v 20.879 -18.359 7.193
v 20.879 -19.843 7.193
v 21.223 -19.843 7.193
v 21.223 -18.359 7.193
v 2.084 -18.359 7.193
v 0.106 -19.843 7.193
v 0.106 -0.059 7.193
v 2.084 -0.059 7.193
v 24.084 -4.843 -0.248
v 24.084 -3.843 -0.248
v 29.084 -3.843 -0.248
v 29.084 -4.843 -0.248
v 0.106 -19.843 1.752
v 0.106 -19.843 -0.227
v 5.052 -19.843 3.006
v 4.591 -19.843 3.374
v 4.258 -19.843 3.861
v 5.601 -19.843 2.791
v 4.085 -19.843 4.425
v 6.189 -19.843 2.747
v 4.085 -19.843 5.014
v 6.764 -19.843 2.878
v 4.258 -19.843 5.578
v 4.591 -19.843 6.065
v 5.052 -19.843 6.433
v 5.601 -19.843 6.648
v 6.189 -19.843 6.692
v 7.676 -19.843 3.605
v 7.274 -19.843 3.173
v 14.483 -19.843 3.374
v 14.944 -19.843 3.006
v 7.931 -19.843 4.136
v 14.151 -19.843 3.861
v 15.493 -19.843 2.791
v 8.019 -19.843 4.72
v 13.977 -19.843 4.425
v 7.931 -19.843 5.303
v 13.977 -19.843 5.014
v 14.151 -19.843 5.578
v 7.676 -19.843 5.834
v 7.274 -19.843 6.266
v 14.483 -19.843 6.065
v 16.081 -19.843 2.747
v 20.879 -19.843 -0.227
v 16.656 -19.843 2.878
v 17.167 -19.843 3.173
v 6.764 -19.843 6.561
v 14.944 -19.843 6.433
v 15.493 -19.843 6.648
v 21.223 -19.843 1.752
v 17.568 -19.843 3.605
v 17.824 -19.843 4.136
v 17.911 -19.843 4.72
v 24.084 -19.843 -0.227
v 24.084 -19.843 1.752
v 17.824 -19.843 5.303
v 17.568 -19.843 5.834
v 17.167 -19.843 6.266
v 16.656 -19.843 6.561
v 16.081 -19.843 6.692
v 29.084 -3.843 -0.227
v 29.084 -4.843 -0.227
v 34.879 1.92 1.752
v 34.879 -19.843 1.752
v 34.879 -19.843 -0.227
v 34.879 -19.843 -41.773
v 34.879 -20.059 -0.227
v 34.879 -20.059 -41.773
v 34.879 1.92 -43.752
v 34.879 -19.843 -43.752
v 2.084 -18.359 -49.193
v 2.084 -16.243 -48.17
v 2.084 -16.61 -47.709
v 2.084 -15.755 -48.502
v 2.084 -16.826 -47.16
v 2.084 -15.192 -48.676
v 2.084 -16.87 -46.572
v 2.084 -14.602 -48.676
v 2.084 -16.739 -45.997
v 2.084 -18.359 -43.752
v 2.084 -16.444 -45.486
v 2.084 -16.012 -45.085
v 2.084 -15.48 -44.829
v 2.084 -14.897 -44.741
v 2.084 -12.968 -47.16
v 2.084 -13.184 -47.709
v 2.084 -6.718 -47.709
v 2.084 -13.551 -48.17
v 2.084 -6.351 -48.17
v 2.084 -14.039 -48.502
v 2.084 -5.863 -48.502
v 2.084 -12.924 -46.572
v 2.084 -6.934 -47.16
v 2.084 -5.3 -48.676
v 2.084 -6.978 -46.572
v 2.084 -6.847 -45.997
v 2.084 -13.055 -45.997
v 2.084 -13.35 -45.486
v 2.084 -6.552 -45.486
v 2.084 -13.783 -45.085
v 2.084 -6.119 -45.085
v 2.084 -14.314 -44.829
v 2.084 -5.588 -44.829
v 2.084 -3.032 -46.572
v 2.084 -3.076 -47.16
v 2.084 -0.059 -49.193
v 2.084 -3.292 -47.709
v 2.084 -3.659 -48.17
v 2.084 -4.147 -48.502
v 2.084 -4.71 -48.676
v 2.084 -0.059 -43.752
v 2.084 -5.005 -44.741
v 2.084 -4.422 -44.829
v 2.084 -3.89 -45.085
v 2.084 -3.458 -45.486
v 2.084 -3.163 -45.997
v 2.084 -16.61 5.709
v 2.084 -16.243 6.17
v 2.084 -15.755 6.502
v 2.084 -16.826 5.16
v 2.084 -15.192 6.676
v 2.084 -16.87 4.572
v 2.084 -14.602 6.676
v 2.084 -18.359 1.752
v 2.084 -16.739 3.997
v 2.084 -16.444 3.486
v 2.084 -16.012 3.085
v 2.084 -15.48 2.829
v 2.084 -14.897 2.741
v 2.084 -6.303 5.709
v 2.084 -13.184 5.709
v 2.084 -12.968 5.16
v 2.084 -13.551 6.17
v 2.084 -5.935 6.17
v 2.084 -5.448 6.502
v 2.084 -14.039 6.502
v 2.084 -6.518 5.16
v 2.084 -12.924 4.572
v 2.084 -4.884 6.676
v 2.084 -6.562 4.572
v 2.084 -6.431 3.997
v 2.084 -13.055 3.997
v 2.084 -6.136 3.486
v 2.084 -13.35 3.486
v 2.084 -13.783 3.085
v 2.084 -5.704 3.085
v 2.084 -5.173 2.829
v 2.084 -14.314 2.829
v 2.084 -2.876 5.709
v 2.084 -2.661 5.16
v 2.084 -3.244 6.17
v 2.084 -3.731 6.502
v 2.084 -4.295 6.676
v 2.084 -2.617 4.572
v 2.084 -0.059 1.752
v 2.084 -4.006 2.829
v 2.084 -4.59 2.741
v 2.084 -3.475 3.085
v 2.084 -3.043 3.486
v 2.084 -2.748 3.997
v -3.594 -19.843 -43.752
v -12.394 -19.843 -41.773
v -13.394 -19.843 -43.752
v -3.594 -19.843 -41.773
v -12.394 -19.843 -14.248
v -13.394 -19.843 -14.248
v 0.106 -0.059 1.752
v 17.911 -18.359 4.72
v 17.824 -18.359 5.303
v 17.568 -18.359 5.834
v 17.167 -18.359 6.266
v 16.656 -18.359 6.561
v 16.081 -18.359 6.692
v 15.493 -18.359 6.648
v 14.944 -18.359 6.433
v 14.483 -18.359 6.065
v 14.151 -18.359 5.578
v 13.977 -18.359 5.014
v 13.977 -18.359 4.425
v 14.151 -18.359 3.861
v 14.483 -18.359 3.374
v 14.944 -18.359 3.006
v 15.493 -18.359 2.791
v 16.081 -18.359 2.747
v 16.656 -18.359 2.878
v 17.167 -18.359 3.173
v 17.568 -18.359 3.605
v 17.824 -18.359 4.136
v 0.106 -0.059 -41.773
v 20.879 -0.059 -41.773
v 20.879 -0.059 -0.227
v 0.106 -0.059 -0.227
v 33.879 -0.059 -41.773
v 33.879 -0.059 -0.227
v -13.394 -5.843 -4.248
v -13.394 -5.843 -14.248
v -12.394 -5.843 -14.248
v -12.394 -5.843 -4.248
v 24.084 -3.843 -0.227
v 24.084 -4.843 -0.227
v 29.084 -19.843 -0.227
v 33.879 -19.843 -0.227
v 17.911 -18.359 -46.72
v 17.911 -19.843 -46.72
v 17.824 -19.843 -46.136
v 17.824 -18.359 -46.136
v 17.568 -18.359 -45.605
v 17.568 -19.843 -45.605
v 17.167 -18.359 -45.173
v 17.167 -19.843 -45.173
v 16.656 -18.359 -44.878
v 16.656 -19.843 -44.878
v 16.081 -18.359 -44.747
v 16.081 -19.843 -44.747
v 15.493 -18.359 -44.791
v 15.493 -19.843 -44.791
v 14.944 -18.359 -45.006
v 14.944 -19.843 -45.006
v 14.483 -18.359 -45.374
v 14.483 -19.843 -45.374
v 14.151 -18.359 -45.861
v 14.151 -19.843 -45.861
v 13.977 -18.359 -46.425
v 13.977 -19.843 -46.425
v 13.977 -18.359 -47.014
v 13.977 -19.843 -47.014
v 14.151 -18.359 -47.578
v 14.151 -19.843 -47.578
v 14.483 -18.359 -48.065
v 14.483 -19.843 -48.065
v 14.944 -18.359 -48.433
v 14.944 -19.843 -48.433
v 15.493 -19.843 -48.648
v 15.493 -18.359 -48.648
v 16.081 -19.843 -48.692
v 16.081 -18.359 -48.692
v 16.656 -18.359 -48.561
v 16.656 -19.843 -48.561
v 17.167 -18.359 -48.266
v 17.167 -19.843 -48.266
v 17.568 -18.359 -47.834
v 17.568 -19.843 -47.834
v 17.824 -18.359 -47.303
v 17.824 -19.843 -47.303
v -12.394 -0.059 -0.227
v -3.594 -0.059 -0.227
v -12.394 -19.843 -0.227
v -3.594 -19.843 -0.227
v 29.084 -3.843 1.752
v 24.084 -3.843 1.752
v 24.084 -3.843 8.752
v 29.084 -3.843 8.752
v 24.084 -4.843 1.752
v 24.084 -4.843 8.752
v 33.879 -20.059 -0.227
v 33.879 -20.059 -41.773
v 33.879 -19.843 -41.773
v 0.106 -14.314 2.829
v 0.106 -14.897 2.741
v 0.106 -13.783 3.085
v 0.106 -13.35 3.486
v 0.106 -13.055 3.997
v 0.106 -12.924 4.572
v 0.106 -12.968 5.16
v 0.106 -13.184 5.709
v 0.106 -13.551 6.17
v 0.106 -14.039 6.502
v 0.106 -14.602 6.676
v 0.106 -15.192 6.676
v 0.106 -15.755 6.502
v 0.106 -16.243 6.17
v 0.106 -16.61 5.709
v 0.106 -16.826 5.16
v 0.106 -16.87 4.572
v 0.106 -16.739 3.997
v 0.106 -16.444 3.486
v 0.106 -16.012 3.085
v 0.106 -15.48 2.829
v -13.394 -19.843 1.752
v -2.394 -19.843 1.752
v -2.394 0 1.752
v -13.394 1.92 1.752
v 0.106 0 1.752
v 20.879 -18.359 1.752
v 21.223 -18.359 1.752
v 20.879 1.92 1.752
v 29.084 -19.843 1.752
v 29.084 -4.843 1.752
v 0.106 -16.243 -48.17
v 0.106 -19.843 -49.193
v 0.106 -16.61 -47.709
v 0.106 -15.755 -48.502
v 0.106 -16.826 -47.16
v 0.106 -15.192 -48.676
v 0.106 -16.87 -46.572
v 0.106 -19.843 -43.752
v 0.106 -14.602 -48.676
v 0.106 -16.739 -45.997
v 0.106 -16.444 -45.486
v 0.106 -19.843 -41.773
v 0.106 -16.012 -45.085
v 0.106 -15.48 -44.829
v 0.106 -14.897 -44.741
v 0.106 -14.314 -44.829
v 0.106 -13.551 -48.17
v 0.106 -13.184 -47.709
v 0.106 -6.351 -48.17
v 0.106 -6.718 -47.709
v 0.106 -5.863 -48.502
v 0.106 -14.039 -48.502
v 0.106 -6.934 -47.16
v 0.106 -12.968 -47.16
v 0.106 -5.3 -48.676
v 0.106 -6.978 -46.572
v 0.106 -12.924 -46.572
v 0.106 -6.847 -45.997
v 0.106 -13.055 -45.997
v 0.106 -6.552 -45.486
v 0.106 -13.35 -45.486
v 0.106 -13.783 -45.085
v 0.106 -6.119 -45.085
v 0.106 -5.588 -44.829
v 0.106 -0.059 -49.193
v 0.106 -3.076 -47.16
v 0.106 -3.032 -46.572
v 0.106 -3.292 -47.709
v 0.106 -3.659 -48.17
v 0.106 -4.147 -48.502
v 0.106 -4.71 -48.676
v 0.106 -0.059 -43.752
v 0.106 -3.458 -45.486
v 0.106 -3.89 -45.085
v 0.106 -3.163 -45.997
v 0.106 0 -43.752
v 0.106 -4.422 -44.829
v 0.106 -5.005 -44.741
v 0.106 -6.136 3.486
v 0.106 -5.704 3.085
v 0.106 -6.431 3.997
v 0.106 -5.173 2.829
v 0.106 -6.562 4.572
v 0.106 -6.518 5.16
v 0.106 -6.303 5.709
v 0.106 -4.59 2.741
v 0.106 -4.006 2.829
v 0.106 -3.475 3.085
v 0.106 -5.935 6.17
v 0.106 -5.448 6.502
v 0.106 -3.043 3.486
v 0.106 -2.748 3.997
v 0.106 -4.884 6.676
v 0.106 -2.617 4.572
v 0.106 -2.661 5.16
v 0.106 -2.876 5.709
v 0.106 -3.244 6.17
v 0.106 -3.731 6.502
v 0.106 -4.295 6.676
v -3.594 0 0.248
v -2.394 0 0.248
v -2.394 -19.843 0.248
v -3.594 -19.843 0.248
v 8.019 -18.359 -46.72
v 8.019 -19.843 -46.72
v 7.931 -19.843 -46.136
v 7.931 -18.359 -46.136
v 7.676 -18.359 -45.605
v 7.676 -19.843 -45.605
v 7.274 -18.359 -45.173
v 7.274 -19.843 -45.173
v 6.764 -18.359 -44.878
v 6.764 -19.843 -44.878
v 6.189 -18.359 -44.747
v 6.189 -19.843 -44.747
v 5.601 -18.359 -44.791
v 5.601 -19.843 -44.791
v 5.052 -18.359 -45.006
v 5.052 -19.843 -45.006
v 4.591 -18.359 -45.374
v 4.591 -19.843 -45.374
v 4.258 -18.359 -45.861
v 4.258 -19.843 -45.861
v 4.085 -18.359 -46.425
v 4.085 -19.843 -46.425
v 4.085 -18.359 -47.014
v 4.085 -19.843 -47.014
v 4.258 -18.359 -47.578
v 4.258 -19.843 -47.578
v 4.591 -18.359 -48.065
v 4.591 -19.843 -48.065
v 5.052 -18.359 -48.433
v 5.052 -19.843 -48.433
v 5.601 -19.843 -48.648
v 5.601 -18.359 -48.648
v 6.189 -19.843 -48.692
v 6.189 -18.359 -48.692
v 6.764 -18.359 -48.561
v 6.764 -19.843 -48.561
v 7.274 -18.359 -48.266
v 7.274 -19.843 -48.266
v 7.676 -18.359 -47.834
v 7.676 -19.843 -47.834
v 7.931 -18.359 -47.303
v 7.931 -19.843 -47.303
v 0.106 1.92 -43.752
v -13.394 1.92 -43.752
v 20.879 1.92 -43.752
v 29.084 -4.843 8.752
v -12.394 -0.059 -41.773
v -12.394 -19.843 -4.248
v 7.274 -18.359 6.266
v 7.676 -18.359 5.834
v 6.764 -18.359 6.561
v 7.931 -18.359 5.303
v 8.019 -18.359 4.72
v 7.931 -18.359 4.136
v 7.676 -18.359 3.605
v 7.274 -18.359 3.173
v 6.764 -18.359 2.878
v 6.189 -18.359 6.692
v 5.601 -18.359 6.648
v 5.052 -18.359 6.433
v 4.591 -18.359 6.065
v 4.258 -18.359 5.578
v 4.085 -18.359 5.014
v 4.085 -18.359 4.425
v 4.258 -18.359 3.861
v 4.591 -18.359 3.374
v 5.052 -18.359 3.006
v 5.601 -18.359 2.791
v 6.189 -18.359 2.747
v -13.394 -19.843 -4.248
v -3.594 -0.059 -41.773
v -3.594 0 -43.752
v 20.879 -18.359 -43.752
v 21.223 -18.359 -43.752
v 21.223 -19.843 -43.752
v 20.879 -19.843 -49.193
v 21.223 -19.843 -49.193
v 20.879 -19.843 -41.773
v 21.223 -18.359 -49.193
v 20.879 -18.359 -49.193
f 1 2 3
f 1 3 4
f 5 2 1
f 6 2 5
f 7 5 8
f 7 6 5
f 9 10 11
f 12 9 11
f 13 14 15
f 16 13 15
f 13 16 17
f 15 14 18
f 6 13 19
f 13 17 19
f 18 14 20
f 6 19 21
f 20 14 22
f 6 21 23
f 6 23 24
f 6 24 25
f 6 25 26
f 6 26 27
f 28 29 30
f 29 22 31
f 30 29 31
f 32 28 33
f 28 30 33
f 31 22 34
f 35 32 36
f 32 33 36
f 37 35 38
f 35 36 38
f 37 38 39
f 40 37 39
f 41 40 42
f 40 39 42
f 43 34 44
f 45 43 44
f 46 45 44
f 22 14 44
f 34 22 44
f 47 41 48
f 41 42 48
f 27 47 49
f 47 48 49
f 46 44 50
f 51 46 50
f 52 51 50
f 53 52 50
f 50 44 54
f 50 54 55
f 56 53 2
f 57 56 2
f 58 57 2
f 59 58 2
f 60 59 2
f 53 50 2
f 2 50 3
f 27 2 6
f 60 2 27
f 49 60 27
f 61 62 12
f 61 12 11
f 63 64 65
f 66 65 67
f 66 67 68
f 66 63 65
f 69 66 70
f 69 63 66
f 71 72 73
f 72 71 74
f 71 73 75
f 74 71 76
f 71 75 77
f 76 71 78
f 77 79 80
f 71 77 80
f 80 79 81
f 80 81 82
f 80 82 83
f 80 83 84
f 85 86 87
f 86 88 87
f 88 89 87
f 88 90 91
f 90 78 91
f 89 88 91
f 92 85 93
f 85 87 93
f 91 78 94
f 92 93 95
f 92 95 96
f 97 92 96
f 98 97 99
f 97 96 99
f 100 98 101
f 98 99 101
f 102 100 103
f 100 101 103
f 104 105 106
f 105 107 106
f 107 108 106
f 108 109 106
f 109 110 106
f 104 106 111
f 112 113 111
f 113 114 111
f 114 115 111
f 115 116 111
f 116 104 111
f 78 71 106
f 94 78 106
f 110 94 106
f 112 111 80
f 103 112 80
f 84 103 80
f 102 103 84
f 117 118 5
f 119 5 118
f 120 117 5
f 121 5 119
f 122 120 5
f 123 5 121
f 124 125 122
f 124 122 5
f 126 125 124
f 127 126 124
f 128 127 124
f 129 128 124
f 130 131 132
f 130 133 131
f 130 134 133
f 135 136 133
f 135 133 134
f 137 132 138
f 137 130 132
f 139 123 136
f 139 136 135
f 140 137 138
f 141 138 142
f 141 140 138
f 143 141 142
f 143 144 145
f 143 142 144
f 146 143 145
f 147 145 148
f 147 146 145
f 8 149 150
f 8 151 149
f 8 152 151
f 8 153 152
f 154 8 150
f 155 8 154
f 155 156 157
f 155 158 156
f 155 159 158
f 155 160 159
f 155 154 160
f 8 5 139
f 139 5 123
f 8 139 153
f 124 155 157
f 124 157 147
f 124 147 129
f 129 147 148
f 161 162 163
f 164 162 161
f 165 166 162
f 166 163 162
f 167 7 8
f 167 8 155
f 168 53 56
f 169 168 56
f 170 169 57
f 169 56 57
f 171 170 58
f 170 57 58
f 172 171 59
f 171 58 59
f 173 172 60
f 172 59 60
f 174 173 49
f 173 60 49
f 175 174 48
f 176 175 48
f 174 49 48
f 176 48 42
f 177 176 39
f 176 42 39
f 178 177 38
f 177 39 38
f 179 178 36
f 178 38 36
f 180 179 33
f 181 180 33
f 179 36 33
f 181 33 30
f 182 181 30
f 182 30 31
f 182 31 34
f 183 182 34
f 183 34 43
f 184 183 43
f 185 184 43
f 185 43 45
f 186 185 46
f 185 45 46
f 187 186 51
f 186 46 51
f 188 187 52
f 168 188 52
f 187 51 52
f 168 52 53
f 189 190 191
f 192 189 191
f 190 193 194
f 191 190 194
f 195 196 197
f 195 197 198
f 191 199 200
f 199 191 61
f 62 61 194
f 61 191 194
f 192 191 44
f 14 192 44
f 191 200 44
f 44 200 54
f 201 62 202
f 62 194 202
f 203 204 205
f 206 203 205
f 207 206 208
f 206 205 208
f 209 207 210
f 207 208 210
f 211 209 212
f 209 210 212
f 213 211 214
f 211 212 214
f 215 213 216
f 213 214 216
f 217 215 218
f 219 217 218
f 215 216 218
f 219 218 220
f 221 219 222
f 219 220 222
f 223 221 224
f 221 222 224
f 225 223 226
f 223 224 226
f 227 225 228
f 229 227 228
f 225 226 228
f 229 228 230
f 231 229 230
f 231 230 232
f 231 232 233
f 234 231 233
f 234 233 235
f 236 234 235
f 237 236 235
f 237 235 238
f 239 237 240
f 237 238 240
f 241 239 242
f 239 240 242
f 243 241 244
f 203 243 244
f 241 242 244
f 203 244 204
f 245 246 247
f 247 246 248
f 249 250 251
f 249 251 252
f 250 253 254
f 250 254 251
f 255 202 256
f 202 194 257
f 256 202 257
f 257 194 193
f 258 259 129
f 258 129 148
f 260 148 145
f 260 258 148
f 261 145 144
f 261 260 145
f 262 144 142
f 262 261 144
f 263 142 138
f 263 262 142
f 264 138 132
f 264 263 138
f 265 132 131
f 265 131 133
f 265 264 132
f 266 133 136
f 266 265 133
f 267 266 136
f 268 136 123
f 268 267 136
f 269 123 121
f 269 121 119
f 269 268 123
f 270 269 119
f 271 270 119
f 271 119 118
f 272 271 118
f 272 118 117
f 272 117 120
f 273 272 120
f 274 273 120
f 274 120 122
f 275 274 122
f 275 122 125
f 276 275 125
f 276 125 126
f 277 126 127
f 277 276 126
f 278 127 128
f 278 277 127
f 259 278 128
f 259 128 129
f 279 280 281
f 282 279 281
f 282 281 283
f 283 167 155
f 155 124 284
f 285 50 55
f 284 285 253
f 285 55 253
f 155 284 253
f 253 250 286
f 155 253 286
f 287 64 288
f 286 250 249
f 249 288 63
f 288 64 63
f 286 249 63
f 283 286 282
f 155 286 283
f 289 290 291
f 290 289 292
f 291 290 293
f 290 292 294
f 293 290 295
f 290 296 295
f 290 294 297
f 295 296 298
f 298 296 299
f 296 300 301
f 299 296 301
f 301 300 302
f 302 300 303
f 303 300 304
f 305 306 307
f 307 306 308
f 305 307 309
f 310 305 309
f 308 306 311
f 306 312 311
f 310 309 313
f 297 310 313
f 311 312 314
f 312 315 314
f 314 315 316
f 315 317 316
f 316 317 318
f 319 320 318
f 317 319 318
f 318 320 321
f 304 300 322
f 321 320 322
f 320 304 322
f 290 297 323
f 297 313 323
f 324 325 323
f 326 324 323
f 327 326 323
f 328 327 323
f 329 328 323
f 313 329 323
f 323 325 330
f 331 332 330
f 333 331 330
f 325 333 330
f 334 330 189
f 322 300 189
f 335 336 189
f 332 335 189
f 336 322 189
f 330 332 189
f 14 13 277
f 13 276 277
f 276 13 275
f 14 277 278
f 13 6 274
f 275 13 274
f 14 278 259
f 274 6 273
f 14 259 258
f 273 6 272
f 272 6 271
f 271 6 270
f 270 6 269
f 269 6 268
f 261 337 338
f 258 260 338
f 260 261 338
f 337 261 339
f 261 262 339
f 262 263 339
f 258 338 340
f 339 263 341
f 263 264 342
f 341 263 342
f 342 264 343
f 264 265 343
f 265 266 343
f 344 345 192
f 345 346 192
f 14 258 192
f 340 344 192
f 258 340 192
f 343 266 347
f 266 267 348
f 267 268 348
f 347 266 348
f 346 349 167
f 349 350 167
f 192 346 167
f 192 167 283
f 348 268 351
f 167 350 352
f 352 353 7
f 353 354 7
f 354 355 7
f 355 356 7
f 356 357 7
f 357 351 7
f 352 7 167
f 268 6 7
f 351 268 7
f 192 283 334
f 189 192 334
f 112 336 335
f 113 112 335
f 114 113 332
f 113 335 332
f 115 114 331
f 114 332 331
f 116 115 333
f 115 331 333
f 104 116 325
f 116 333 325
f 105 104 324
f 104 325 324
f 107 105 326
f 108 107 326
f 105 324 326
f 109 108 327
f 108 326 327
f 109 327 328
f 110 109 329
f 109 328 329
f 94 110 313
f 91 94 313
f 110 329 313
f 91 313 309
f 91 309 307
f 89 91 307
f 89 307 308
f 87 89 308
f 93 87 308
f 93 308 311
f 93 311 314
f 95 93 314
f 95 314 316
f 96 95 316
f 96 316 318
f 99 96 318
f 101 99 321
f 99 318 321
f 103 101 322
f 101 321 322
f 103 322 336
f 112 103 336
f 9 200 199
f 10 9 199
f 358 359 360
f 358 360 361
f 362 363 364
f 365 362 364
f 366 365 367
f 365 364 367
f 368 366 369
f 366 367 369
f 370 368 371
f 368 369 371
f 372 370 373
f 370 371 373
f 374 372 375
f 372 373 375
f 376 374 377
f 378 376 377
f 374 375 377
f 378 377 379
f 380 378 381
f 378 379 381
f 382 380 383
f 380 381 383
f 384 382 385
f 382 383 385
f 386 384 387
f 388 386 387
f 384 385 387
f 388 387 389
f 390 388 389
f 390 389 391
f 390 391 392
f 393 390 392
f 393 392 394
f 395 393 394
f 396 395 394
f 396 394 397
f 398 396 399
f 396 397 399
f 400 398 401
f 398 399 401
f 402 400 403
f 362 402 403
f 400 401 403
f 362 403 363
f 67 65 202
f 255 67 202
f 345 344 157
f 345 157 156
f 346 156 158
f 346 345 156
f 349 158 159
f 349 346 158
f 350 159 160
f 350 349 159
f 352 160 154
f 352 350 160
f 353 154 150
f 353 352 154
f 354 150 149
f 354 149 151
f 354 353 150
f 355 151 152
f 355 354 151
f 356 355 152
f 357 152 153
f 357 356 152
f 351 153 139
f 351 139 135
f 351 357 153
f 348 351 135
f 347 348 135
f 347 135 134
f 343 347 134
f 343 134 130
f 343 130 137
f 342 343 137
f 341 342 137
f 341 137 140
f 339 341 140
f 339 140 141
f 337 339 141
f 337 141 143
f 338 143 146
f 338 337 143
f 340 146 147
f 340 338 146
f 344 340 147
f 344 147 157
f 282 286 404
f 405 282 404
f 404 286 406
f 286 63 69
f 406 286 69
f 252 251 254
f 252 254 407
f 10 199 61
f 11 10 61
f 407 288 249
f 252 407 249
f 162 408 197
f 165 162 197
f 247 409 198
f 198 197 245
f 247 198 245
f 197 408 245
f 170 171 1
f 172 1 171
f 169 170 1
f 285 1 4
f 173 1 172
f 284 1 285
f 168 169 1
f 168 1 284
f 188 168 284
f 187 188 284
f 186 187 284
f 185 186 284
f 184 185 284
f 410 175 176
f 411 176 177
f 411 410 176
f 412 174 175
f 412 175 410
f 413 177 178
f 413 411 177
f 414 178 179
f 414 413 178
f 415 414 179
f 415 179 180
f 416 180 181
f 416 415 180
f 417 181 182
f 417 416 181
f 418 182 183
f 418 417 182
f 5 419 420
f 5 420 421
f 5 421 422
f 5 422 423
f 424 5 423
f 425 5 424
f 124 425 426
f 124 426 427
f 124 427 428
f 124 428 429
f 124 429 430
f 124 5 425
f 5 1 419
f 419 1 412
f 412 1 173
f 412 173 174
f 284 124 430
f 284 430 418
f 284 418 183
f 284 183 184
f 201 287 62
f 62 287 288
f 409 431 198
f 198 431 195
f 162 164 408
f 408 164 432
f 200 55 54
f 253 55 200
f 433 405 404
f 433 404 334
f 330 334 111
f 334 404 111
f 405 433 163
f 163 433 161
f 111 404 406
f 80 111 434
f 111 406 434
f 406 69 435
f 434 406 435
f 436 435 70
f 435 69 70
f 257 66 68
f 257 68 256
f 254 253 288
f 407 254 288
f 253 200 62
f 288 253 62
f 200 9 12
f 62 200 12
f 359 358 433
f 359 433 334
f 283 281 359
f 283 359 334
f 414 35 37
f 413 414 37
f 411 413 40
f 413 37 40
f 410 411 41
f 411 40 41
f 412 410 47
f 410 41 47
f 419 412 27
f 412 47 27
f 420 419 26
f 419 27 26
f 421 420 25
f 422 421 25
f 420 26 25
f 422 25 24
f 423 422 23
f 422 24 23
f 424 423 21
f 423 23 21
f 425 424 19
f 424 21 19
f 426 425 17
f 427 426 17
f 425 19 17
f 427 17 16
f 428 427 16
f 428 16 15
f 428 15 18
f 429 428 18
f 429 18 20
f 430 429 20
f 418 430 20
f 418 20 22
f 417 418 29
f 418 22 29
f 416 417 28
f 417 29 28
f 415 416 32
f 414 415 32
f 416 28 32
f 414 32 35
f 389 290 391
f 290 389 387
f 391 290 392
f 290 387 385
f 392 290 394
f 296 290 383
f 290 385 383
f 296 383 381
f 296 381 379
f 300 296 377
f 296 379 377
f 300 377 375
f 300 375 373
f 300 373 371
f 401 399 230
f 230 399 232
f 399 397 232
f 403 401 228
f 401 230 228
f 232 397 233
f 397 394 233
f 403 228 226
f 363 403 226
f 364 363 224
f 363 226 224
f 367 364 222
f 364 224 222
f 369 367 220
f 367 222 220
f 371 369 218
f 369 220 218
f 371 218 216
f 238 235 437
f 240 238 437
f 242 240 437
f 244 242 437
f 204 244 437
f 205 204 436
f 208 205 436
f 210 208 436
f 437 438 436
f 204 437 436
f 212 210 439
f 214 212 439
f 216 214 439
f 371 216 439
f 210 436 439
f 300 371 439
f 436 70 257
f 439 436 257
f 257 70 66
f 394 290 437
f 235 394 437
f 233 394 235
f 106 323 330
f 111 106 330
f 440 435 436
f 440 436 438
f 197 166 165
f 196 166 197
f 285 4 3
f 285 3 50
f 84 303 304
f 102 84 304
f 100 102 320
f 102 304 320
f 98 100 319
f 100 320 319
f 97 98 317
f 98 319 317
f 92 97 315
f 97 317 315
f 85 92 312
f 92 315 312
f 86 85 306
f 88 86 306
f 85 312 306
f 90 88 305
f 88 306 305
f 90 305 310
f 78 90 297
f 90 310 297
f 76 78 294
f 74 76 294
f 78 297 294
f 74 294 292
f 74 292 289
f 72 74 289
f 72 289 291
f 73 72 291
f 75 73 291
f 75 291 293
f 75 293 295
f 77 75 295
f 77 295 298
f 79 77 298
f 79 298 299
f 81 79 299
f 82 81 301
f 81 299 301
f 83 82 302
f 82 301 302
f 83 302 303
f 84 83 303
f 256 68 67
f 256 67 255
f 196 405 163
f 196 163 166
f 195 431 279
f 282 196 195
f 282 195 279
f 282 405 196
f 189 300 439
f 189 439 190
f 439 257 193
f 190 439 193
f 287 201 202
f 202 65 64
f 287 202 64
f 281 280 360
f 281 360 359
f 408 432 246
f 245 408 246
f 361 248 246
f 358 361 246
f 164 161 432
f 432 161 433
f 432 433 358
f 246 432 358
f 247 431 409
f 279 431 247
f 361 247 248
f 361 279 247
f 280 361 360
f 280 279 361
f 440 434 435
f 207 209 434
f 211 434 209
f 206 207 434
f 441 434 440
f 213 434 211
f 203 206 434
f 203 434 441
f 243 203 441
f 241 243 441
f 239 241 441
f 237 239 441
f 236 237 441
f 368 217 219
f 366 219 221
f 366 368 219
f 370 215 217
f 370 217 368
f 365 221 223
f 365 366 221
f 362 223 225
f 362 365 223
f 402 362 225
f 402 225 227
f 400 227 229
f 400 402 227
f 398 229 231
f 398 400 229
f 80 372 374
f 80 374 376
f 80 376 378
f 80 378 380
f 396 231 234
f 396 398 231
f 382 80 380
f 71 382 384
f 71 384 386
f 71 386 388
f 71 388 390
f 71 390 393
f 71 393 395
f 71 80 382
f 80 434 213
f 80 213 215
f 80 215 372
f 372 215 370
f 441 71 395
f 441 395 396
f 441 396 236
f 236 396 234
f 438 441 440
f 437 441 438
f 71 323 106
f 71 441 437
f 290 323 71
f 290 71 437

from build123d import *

# Parameters (mm, degrees)
SKETCH2_W                 = 7.5
SKETCH2_H                 = 20
SKETCH2_R                 = 2
BOSS_EXTRUDE1_DEPTH       = 2
SKETCH4_W                 = 21
SKETCH4_H                 = 20
BOSS_EXTRUDE2_DEPTH       = 2
SKETCH5_W                 = 21
SKETCH5_H                 = 46
BOSS_EXTRUDE3_DEPTH       = 2
SKETCH6_W                 = 21
SKETCH6_H                 = 2
BOSS_EXTRUDE4_DEPTH       = 22
SKETCH7_W                 = 6.5
SKETCH7_H                 = 20
SKETCH7_R                 = 2
BOSS_EXTRUDE7_DEPTH       = 2
SKETCH8_W                 = 20
SKETCH8_H                 = 6.5
SKETCH8_R                 = 2
BOSS_EXTRUDE9_DEPTH       = 1.5
SKETCH9_R                 = 2
BOSS_EXTRUDE10_DEPTH      = 1.5
SCALE1_SCALE              = 0.98
SCALE2_SCALE              = 0.98
SCALE3_SCALE              = 1.03
BOSS_EXTRUDE11_DEPTH      = 14
SKETCH13_W                = 1
SKETCH13_H                = 41.546904
BOSS_EXTRUDE12_DEPTH      = 20
SKETCH15_W                = 13.656209454
SKETCH15_H                = 5.440666
CUT_EXTRUDE1_DEPTH        = 20
SKETCH16_W                = 13.65620945
SKETCH16_H                = 5.440666
CUT_EXTRUDE2_DEPTH        = 20
BOSS_EXTRUDE13_DEPTH      = 13.5
SKETCH18_W                = 2.5
SKETCH18_H                = 19.843095219
CUT_EXTRUDE3_DEPTH        = 51.944418
SKETCH19_W                = 1
SKETCH19_H                = 41.546904
BOSS_EXTRUDE14_DEPTH      = 19.78424
CUT_EXTRUDE4_REACH        = 52.944
SKETCH20_W                = 5
SKETCH20_H                = 15
SKETCH21_W                = 10
SKETCH21_H                = 14
CUT_EXTRUDE5_DEPTH        = 19.5
SKETCH22_W                = 5
SKETCH22_H                = 1
BOSS_EXTRUDE15_DEPTH      = 7
BOSS_EXTRUDE15_DEPTH_BACK = 2
SKETCH23_W                = 1.2
SKETCH23_H                = 19.843095219
CUT_EXTRUDE9_DEPTH        = 44


with BuildPart() as part:
    # Sketch2 → Boss-Extrude1 (new body)
    with BuildSketch(Plane(origin=(0, 0, 0), x_dir=(0, 0, -1), z_dir=(1, 0, 0))):
        with Locations((-3.75, -10)):
            Rectangle(SKETCH2_W, SKETCH2_H)
        with Locations((-5, -4.580102725)):
            Circle(SKETCH2_R, mode=Mode.SUBTRACT)
        with Locations((-5, -15)):
            Circle(SKETCH2_R, mode=Mode.SUBTRACT)
    extrude(amount=BOSS_EXTRUDE1_DEPTH)

    # Sketch4 → Boss-Extrude2 (add)
    with BuildSketch(Plane.XY):
        with Locations((10.5, -10)):
            Rectangle(SKETCH4_W, SKETCH4_H)
    extrude(amount=BOSS_EXTRUDE2_DEPTH)

    # Sketch5 → Boss-Extrude3 (add)
    with BuildSketch(Plane(origin=(0, 0, 0), x_dir=(1, 0, 0), z_dir=(0, 1, 0))):
        with Locations((10.5, 21)):
            Rectangle(SKETCH5_W, SKETCH5_H)
    extrude(amount=BOSS_EXTRUDE3_DEPTH)

    # Sketch6 → Boss-Extrude4 (add)
    with BuildSketch(Plane(origin=(0, 2, 0), x_dir=(1, 0, 0), z_dir=(0, 1, 0))):
        with Locations((10.5, 43)):
            Rectangle(SKETCH6_W, SKETCH6_H)
    extrude(amount=-BOSS_EXTRUDE4_DEPTH)

    # Sketch7 → Boss-Extrude7 (add)
    with BuildSketch(Plane.ZY):
        with Locations((-46.25, -10)):
            Rectangle(SKETCH7_W, SKETCH7_H)
        with Locations((-47, -5)):
            Circle(SKETCH7_R, mode=Mode.SUBTRACT)
        with Locations((-47, -15)):
            Circle(SKETCH7_R, mode=Mode.SUBTRACT)
    extrude(amount=-BOSS_EXTRUDE7_DEPTH)

    # Sketch8 → Boss-Extrude9 (add)
    with BuildSketch(Plane.XZ.offset(20)):
        with Locations((11, -46.25)):
            Rectangle(SKETCH8_W, SKETCH8_H)
        with Locations((6, -47)):
            Circle(SKETCH8_R, mode=Mode.SUBTRACT)
        with Locations((16, -47)):
            Circle(SKETCH8_R, mode=Mode.SUBTRACT)
    extrude(amount=-BOSS_EXTRUDE9_DEPTH)

    # Sketch9 → Boss-Extrude10 (add)
    with BuildSketch(Plane.XZ.offset(20)):
        Polygon((21, 2), (21, 7.5), (16, 7.5), (6, 7.5), (2, 7.5), (2, 2), align=None)
        with Locations((6, 5)):
            Circle(SKETCH9_R, mode=Mode.SUBTRACT)
        with Locations((16, 5)):
            Circle(SKETCH9_R, mode=Mode.SUBTRACT)
    extrude(amount=-BOSS_EXTRUDE10_DEPTH)


with BuildPart() as part_1:
    # Scale1: scaled about (9.7960723, -5.455619142, -21)
    add(part.part.scale(SCALE1_SCALE).moved(Location((0.195921446, -0.109112383, -0.42))))


with BuildPart() as part_2:
    # Scale2: scaled about (9.7960723, -5.455619142, -21)
    add(part_1.part.scale(SCALE2_SCALE).moved(Location((0.195921446, -0.109112383, -0.42))))


with BuildPart() as part_3:
    # Scale3: scaled about (9.7960723, -5.455619142, -21)
    add(part_2.part.scale(SCALE3_SCALE).moved(Location((-0.293882169, 0.163668574, 0.63))))

    # Sketch11 → Boss-Extrude11 (add)
    with BuildSketch(Plane(origin=(20.879132028, 0, 0), x_dir=(0, 0, -1), z_dir=(1, 0, 0))):
        Polygon((-1.751876, 1.919568781), (43.751876, 1.919568781), (43.751876, -18.359277219), (49.192542, -18.359277219), (49.192542, -19.843095219), (41.773452, -19.843095219), (41.773452, -0.058855219), (0.226548, -0.058855219), (0.226548, -19.843095219), (-7.192542, -19.843095219), (-7.192542, -18.359277219), (-1.751876, -18.359277219), align=None)
    extrude(amount=BOSS_EXTRUDE11_DEPTH)

    # Sketch13 → Boss-Extrude12 (add)
    with BuildSketch(Plane(origin=(0, -0.058855219, 0), x_dir=(-1, 0, 0), z_dir=(0, -1, 0))):
        with Locations((-34.379132028, 21)):
            Rectangle(SKETCH13_W, SKETCH13_H)
    extrude(amount=BOSS_EXTRUDE12_DEPTH)

    # Sketch15 → Cut-Extrude1 (cut)
    with BuildSketch(Plane(origin=(0, -18.359277219, 0), x_dir=(1, 0, 0), z_dir=(0, 1, 0))):
        with Locations((28.051027301, 46.472209)):
            Rectangle(SKETCH15_W, SKETCH15_H)
    extrude(amount=-CUT_EXTRUDE1_DEPTH, mode=Mode.SUBTRACT)

    # Sketch16 → Cut-Extrude2 (cut)
    with BuildSketch(Plane(origin=(0, -18.359277219, 0), x_dir=(1, 0, 0), z_dir=(0, 1, 0))):
        with Locations((28.051027303, -4.472209)):
            Rectangle(SKETCH16_W, SKETCH16_H)
    extrude(amount=-CUT_EXTRUDE2_DEPTH, mode=Mode.SUBTRACT)

    # Sketch17 → Boss-Extrude13 (add)
    with BuildSketch(Plane.ZY.offset(-0.105680028)):
        Polygon((1.751876, 1.919568781), (-43.751876, 1.919568781), (-43.751876, -0.058855219), (-43.751876, -19.843095219), (-41.773452, -19.843095219), (-41.773452, -0.058855219), (-0.226548, -0.058855219), (-0.226548, -19.843095219), (1.751876, -19.843095219), (1.751876, -0.058855219), align=None)
    extrude(amount=BOSS_EXTRUDE13_DEPTH)

    # Sketch18 → Cut-Extrude3 (cut, through all)
    with BuildSketch(Plane.XY.offset(1.751876)):
        with Locations((-1.144319972, -9.92154761)):
            Rectangle(SKETCH18_W, SKETCH18_H)
    extrude(amount=-CUT_EXTRUDE3_DEPTH, mode=Mode.SUBTRACT)

    # Sketch19 → Boss-Extrude14 (add)
    with BuildSketch(Plane.XZ.offset(0.058855219)):
        with Locations((-12.894319972, -21)):
            Rectangle(SKETCH19_W, SKETCH19_H)
    extrude(amount=BOSS_EXTRUDE14_DEPTH)

    # Sketch20 → Cut-Extrude4 (cut, up to next)
    with BuildSketch(Plane.XY.offset(1.751876), mode=Mode.PRIVATE) as cut_extrude4_sk1:
        with Locations((26.584104028, -12.343095219)):
            Rectangle(SKETCH20_W, SKETCH20_H)
    cut_extrude4_tool1 = extrude(cut_extrude4_sk1.sketch, amount=-CUT_EXTRUDE4_REACH, mode=Mode.PRIVATE) & part_3.part
    add(cut_extrude4_tool1.solids().sort_by_distance((26.584104, -12.343095, 1.751876))[0], mode=Mode.SUBTRACT)

    # Sketch21 → Cut-Extrude5 (cut)
    with BuildSketch(Plane.ZY.offset(13.394319972)):
        with Locations((-9.248124, -12.843095219)):
            Rectangle(SKETCH21_W, SKETCH21_H)
    extrude(amount=-CUT_EXTRUDE5_DEPTH, mode=Mode.SUBTRACT)

    # Sketch22 → Boss-Extrude15 (add, two sides)
    with BuildSketch(Plane.XY.offset(1.751876)) as boss_extrude15_sk:
        with Locations((26.584104028, -4.343095219)):
            Rectangle(SKETCH22_W, SKETCH22_H)
    extrude(amount=BOSS_EXTRUDE15_DEPTH)
    extrude(boss_extrude15_sk.sketch, amount=-BOSS_EXTRUDE15_DEPTH_BACK)

    # Sketch23 → Cut-Extrude9 (cut)
    with BuildSketch(Plane(origin=(0, 0, -43.751876), x_dir=(-1, 0, 0), z_dir=(0, 0, -1))):
        with Locations((2.994319972, -9.92154761)):
            Rectangle(SKETCH23_W, SKETCH23_H)
    extrude(amount=-CUT_EXTRUDE9_DEPTH, mode=Mode.SUBTRACT)


solid = part_3.part
